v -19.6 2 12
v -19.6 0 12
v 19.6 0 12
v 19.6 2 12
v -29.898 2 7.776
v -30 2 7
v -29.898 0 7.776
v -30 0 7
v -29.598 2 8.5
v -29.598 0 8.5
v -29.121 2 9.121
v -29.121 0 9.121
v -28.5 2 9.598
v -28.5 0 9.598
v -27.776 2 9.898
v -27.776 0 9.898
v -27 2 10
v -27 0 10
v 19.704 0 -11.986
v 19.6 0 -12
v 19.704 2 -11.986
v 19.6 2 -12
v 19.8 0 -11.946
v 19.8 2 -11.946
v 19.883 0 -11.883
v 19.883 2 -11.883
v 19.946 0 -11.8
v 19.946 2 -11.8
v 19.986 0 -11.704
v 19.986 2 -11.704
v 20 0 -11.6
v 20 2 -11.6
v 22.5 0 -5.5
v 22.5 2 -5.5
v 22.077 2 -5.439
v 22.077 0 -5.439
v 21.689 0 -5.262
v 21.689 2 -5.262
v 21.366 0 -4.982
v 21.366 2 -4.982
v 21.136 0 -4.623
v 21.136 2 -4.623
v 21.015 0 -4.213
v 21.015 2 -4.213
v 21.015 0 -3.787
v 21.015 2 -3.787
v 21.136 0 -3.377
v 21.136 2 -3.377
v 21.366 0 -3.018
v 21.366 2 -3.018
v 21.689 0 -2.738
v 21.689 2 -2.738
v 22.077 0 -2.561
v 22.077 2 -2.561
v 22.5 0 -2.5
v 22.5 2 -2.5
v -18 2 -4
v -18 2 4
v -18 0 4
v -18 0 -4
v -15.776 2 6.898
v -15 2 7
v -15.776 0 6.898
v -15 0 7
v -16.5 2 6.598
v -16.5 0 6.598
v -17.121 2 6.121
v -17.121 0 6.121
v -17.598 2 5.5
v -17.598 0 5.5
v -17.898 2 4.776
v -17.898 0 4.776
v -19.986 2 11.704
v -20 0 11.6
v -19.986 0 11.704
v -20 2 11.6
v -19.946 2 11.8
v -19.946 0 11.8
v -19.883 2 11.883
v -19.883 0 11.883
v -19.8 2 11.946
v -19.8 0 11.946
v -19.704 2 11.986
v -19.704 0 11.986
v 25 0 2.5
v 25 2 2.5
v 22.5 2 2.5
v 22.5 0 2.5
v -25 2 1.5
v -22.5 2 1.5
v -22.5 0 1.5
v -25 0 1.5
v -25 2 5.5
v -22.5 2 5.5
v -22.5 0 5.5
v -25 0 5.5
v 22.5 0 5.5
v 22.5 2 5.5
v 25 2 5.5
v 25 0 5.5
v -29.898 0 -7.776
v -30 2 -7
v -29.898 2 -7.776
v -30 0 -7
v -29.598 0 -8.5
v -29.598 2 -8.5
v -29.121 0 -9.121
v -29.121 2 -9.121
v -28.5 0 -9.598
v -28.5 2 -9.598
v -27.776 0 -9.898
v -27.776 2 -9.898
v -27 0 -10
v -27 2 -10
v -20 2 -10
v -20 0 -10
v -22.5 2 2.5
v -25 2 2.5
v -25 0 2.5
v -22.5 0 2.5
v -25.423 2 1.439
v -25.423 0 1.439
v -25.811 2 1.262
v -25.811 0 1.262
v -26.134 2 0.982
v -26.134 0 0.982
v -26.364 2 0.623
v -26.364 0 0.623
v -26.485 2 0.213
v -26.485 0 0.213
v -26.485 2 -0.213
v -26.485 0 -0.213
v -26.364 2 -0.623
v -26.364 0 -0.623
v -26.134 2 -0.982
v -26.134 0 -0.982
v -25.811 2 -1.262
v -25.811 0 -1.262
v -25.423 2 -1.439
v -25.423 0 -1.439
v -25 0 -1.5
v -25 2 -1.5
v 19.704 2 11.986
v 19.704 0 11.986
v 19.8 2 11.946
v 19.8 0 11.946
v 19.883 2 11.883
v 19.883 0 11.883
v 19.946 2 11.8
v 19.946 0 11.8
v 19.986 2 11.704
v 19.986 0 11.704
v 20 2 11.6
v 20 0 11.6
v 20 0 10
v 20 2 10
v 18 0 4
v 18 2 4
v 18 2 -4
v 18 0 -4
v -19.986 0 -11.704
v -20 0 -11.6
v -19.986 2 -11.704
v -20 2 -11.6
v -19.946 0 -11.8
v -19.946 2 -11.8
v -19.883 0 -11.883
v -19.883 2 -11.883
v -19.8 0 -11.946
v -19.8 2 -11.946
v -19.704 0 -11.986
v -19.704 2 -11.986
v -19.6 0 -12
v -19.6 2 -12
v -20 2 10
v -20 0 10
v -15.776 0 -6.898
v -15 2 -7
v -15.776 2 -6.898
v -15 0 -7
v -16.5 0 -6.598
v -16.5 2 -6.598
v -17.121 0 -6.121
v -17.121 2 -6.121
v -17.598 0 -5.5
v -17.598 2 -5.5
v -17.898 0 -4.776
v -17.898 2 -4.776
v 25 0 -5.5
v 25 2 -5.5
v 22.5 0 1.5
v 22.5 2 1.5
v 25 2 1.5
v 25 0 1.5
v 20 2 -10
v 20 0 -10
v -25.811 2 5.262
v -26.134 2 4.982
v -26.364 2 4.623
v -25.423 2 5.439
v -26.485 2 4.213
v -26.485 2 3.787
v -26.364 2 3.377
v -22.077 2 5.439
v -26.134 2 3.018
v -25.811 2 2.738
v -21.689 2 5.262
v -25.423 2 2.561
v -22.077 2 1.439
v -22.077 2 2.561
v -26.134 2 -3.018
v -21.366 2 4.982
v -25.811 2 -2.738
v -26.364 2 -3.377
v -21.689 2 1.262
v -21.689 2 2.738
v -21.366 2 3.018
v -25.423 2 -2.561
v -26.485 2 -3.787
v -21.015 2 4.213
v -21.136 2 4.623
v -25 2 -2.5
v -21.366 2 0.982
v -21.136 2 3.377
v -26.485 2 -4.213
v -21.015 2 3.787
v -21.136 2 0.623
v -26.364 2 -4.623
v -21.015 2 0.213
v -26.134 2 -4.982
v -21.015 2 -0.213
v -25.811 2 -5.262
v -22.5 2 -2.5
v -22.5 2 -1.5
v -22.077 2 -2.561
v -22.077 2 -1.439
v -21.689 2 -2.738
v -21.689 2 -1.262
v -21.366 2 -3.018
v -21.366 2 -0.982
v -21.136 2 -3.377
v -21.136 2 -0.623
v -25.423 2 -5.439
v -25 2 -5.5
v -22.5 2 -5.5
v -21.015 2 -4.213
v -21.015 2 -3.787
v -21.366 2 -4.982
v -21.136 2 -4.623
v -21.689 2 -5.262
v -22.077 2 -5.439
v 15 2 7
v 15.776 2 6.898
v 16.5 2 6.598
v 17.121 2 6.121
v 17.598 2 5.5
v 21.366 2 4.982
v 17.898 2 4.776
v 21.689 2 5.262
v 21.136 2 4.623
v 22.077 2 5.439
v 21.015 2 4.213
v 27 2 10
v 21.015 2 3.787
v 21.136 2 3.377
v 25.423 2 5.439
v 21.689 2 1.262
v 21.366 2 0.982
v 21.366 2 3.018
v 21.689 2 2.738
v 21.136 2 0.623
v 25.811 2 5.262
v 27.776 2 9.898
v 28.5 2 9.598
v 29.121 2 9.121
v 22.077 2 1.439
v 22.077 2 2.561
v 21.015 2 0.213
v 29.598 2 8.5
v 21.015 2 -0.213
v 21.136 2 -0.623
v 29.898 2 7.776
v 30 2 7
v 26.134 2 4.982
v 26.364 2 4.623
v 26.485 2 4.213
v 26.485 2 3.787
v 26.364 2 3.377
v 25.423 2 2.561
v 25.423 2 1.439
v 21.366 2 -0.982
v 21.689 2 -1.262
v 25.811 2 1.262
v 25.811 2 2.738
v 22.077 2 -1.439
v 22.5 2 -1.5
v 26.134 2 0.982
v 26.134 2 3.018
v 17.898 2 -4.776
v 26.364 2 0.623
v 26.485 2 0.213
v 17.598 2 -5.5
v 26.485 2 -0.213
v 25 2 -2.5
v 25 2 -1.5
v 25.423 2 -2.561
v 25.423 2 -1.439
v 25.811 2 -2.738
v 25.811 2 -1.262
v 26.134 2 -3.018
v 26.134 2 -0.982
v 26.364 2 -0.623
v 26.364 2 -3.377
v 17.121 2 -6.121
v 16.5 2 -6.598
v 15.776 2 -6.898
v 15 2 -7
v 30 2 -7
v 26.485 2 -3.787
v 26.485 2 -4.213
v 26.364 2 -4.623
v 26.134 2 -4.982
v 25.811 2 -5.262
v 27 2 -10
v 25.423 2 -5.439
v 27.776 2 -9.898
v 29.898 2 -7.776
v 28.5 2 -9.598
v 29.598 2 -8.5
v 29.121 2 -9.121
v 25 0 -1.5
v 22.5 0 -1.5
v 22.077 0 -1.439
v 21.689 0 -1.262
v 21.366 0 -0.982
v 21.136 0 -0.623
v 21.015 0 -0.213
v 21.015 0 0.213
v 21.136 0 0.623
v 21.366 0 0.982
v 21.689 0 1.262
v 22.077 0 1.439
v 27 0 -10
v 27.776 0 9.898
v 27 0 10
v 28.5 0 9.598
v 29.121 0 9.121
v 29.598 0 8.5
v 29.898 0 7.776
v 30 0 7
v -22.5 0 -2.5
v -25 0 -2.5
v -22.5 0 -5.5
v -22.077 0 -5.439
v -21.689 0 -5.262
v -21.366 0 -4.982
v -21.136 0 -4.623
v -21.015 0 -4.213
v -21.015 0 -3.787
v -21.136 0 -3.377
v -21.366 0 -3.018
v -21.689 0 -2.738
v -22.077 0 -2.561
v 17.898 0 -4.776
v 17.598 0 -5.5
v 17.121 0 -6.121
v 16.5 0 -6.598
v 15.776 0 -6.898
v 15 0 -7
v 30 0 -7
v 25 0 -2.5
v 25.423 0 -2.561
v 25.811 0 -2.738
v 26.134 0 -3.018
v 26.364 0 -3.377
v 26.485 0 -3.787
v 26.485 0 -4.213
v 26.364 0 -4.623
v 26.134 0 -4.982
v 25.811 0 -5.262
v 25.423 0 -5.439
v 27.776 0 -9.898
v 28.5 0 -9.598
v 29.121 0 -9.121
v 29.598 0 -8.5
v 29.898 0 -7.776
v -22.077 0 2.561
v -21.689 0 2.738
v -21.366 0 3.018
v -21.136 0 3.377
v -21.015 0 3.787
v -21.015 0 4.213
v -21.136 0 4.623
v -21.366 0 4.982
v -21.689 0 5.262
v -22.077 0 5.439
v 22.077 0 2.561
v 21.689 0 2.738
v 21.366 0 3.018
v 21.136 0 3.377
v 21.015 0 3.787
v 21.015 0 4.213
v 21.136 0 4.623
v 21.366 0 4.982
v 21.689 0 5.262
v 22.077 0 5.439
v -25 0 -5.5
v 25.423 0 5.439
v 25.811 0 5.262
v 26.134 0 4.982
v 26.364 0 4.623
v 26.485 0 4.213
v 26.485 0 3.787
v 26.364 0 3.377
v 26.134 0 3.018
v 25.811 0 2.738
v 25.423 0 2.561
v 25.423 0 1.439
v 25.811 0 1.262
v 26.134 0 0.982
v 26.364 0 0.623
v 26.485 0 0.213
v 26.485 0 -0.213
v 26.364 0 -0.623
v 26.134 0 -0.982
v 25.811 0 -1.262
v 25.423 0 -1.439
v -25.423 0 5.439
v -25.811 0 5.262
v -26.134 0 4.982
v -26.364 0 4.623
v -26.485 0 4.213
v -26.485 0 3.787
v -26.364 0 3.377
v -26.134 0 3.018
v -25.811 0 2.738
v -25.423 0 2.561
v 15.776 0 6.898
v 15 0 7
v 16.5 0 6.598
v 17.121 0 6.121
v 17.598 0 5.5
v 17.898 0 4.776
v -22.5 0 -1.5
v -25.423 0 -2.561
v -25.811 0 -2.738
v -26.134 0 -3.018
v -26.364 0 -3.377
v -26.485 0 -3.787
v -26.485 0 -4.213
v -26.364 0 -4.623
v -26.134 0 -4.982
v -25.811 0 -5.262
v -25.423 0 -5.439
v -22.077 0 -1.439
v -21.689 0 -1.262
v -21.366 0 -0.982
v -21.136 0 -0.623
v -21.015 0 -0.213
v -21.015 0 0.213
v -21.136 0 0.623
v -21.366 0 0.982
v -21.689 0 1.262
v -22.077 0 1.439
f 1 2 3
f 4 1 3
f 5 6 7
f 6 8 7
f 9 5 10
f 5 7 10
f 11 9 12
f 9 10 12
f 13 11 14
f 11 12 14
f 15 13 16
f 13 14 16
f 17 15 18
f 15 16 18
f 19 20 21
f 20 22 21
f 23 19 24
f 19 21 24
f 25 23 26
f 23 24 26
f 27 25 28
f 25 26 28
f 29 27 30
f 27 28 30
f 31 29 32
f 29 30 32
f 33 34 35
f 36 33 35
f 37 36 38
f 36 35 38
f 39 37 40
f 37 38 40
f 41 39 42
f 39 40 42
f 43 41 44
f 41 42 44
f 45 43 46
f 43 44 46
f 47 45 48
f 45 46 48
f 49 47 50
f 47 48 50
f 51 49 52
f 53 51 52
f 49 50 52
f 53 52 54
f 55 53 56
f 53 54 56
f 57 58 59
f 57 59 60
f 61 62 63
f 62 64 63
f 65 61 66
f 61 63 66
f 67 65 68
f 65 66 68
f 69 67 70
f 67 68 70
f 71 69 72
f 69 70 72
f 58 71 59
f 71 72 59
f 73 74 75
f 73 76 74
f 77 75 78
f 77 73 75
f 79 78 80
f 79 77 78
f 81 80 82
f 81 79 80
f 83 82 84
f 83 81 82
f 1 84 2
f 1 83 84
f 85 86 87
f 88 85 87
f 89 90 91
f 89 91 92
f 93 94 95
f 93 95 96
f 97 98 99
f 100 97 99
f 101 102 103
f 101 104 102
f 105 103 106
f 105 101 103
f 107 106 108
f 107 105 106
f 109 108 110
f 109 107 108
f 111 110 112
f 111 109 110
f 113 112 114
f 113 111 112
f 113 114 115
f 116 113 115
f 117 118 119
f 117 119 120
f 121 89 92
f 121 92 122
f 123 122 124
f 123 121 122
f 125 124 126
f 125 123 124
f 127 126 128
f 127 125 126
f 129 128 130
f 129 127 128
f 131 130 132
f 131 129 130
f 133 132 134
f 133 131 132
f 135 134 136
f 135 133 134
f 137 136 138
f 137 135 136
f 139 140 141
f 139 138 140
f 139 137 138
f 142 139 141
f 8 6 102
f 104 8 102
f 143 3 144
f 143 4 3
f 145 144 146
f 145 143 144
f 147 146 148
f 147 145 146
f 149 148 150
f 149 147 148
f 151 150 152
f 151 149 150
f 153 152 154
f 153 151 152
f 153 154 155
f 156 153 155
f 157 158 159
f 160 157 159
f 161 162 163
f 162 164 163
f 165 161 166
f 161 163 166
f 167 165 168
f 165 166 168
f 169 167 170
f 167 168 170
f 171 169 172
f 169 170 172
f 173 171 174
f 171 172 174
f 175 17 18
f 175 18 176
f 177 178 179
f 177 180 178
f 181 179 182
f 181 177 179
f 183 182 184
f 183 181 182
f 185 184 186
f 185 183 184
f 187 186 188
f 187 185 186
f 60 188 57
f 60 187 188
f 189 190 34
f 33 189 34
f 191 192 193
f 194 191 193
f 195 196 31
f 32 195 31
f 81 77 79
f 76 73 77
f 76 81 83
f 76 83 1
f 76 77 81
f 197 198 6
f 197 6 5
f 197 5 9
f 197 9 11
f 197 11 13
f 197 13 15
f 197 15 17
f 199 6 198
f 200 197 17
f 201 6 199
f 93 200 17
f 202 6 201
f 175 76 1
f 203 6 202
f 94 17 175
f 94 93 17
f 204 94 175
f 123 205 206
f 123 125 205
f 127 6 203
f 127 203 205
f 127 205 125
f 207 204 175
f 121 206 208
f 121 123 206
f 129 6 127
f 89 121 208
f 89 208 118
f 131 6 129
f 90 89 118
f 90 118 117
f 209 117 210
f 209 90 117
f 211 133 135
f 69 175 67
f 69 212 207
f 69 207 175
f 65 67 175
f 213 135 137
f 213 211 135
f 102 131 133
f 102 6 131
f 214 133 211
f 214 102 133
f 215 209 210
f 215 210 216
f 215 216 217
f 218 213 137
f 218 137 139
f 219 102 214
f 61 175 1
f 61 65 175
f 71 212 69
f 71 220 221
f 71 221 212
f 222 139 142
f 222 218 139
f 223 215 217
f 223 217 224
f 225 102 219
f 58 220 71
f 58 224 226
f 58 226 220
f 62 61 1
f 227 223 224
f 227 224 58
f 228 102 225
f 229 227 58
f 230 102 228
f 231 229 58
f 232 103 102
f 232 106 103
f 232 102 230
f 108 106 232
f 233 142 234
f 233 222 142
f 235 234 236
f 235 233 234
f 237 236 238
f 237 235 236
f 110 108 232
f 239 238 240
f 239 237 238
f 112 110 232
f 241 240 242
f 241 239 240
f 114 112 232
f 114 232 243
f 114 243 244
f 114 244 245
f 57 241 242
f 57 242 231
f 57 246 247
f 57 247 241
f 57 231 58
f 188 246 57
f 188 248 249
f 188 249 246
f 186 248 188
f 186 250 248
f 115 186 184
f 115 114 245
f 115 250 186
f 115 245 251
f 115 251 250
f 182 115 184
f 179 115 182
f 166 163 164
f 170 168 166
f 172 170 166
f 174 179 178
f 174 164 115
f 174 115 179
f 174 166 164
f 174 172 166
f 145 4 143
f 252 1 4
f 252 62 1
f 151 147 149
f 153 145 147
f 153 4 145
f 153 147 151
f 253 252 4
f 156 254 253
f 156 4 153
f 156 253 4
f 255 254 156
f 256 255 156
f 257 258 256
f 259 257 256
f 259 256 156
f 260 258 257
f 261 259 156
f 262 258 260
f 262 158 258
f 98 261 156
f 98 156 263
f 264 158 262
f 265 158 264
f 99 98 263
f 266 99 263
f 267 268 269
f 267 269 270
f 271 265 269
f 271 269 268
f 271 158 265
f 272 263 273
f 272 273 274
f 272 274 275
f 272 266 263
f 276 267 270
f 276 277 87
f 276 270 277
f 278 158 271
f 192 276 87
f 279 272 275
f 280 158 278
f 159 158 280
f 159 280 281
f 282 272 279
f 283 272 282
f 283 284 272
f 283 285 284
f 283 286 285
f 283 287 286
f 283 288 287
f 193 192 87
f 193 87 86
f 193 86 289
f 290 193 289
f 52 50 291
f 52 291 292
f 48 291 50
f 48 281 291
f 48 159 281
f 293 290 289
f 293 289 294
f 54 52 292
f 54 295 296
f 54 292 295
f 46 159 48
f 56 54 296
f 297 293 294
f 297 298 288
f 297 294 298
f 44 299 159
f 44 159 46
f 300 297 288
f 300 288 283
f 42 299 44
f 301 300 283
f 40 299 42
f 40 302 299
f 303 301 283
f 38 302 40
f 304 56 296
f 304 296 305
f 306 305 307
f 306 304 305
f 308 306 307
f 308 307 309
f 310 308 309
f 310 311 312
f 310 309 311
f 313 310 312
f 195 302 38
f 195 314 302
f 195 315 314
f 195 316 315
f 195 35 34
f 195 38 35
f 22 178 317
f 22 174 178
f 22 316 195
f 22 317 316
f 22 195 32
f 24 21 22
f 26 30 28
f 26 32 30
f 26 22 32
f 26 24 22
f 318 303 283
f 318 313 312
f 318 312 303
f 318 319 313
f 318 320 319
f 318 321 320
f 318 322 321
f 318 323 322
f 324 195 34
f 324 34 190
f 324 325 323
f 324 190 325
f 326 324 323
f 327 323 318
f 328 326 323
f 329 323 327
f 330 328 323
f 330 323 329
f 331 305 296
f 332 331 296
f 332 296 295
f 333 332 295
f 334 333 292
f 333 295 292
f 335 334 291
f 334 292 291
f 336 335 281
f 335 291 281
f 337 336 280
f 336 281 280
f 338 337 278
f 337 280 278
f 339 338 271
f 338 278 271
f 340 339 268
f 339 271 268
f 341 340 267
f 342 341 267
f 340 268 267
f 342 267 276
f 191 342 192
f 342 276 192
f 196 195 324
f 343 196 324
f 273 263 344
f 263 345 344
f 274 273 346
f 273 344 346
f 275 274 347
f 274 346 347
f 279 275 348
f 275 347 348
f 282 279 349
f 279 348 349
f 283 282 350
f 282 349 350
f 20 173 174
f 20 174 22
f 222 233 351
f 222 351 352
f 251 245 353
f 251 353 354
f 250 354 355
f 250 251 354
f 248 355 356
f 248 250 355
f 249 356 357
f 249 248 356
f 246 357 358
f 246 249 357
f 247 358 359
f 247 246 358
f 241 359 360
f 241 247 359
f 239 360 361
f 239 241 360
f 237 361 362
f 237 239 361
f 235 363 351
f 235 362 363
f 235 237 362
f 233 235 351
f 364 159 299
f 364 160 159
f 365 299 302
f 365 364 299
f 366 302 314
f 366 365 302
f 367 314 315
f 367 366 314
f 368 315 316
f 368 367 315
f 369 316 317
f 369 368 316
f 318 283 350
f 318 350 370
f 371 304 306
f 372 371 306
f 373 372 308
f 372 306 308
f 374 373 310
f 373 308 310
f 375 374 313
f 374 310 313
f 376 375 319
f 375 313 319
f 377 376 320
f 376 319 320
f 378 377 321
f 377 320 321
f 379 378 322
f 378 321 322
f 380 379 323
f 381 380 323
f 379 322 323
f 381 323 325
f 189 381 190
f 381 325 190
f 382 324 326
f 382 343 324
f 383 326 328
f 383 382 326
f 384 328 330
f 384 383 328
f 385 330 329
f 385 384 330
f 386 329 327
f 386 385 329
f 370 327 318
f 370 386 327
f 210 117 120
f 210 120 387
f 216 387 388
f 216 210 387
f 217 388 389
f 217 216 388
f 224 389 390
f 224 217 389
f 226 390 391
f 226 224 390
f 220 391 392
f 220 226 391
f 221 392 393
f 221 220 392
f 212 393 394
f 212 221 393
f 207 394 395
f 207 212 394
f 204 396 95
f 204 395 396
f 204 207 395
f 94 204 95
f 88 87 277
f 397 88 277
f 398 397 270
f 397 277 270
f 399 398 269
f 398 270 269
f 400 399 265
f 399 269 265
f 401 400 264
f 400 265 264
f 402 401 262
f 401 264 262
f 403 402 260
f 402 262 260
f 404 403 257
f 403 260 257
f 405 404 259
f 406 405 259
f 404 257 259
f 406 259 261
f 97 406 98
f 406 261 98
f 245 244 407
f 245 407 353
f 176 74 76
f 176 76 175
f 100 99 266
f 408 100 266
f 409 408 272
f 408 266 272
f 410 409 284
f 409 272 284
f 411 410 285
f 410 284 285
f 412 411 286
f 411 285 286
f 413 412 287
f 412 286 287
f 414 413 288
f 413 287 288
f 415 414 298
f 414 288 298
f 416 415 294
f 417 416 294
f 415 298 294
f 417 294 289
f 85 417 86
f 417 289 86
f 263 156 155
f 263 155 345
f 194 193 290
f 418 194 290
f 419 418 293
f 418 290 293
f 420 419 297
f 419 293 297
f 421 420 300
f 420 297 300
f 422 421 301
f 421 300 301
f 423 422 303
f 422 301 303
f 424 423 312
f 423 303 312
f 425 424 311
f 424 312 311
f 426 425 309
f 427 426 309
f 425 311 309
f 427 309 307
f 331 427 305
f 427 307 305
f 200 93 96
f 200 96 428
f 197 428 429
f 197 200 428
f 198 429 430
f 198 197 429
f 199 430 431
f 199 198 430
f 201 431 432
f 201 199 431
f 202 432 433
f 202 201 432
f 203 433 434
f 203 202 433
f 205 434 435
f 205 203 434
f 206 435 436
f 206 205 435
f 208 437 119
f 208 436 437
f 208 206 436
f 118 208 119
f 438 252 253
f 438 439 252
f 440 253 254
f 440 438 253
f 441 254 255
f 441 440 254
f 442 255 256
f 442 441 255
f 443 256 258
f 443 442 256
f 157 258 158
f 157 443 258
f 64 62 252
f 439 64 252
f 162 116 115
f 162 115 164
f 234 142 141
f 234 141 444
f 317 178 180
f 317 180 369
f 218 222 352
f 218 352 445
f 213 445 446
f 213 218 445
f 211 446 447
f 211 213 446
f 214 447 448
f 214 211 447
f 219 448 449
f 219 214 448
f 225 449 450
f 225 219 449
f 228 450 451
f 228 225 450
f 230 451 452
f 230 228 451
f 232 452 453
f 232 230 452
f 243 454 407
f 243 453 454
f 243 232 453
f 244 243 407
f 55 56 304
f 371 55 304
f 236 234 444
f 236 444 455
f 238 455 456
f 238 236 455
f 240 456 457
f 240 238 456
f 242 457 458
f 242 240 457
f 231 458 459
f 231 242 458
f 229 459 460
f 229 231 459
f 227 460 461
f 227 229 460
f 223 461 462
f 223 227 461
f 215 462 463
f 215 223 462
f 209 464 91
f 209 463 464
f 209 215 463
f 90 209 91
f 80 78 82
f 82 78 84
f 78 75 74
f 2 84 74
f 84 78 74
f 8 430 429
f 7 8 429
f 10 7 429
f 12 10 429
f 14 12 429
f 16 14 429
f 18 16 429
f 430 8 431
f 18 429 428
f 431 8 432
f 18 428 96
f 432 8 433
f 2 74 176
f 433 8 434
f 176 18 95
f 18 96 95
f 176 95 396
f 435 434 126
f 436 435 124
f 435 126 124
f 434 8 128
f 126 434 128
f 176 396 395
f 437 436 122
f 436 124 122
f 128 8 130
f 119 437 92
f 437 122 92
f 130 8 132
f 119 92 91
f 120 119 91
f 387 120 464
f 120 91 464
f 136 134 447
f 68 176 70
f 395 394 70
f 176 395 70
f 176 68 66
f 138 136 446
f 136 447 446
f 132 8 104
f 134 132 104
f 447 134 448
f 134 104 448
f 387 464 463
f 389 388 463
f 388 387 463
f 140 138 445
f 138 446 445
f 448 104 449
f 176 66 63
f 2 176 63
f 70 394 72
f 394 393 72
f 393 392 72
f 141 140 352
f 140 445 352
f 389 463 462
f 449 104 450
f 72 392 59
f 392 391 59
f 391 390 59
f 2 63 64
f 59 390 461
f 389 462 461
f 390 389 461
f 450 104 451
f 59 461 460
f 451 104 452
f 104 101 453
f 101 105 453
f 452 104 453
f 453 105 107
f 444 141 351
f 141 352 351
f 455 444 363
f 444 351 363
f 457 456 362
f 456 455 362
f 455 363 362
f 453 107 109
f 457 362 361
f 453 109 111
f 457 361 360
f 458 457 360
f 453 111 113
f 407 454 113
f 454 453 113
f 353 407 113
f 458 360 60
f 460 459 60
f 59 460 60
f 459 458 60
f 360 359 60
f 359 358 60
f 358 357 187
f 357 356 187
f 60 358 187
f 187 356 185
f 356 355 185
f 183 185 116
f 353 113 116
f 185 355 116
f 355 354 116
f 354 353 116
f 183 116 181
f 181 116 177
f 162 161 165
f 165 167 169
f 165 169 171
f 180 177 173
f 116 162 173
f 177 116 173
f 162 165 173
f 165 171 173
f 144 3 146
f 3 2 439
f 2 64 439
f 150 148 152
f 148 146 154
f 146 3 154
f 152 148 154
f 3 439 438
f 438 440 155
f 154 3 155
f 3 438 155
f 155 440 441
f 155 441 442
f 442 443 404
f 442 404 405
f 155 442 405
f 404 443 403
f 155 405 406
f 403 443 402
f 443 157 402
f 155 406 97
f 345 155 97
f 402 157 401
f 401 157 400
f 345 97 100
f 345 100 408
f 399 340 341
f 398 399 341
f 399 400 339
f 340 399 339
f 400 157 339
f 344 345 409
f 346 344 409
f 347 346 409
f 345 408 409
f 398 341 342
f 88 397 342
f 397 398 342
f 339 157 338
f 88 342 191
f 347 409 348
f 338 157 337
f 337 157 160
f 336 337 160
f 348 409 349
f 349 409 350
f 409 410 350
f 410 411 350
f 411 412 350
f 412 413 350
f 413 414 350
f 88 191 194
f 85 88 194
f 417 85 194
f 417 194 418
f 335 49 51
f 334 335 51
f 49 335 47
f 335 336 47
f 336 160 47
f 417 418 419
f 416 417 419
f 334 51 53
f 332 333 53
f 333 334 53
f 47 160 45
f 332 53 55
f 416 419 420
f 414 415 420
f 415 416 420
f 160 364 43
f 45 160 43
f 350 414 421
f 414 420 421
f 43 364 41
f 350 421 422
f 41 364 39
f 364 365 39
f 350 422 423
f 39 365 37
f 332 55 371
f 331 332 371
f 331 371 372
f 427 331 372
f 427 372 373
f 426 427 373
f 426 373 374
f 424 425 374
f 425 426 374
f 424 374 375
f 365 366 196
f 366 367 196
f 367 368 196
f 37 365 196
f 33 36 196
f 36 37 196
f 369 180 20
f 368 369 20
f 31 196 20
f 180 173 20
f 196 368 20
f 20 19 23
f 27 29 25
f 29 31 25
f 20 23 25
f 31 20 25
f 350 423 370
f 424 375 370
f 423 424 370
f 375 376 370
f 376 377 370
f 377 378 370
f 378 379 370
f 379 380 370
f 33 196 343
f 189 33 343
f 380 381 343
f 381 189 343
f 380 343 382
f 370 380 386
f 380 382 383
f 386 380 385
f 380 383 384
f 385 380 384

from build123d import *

# Parameters (mm, degrees)
SKETCH_1_W          = 40
SKETCH_1_H          = 24
EXTRUDE_1_DEPTH     = 2
SKETCH_4_W          = 60
SKETCH_4_H          = 20
EXTRUDE_3_DEPTH     = 2
CUT_EXTRUDE_3_DEPTH = 33.372828112
SKETCH_7_W          = 36
SKETCH_7_H          = 14
CUT_EXTRUDE_4_DEPTH = 33.372828112
FILLET_1_R          = 3
FILLET_2_R          = 0.4


with BuildPart() as part:
    # 草图1 → 凸台-拉伸1 (new body)
    with BuildSketch(Plane(origin=(0, 0, 0), x_dir=(1, 0, 0), z_dir=(0, 1, 0))):
        Rectangle(SKETCH_1_W, SKETCH_1_H)
    extrude(amount=EXTRUDE_1_DEPTH)

    # 草图4 → 凸台-拉伸3 (add)
    with BuildSketch(Plane(origin=(0, 2, 0), x_dir=(1, 0, 0), z_dir=(0, 1, 0))):
        Rectangle(SKETCH_4_W, SKETCH_4_H)
    extrude(amount=-EXTRUDE_3_DEPTH)

    # 草图6 → 切除-拉伸3 (cut, through all)
    with BuildSketch(Plane(origin=(0, 2, 0), x_dir=(1, 0, 0), z_dir=(0, 1, 0))):
        with BuildLine():
            Line((-25, 1.5), (-22.5, 1.5))
            ThreePointArc((-22.5, 1.5), (-21, 0), (-22.5, -1.5))
            Line((-22.5, -1.5), (-25, -1.5))
            ThreePointArc((-25, -1.5), (-26.5, 0), (-25, 1.5))
        make_face()
        with BuildLine():
            Line((-25, 5.5), (-22.5, 5.5))
            ThreePointArc((-22.5, 5.5), (-21, 4), (-22.5, 2.5))
            Line((-22.5, 2.5), (-25, 2.5))
            ThreePointArc((-25, 2.5), (-26.5, 4), (-25, 5.5))
        make_face()
        with BuildLine():
            Line((-25, -2.5), (-22.5, -2.5))
            ThreePointArc((-22.5, -2.5), (-21, -4), (-22.5, -5.5))
            Line((-22.5, -5.5), (-25, -5.5))
            ThreePointArc((-25, -5.5), (-26.5, -4), (-25, -2.5))
        make_face()
        with BuildLine():
            Line((25, -2.5), (22.5, -2.5))
            ThreePointArc((22.5, -2.5), (21, -4), (22.5, -5.5))
            Line((22.5, -5.5), (25, -5.5))
            ThreePointArc((25, -5.5), (26.5, -4), (25, -2.5))
        make_face()
        with BuildLine():
            Line((25, 1.5), (22.5, 1.5))
            ThreePointArc((22.5, 1.5), (21, 0), (22.5, -1.5))
            Line((22.5, -1.5), (25, -1.5))
            ThreePointArc((25, -1.5), (26.5, 0), (25, 1.5))
        make_face()
        with BuildLine():
            Line((25, 5.5), (22.5, 5.5))
            ThreePointArc((22.5, 5.5), (21, 4), (22.5, 2.5))
            Line((22.5, 2.5), (25, 2.5))
            ThreePointArc((25, 2.5), (26.5, 4), (25, 5.5))
        make_face()
    extrude(amount=-CUT_EXTRUDE_3_DEPTH, mode=Mode.SUBTRACT)

    # 草图7 → 切除-拉伸4 (cut, through all)
    with BuildSketch(Plane(origin=(0, 2, 0), x_dir=(1, 0, 0), z_dir=(0, 1, 0))):
        Rectangle(SKETCH_7_W, SKETCH_7_H)
    extrude(amount=-CUT_EXTRUDE_4_DEPTH, mode=Mode.SUBTRACT)

    # 圆角1
    fillet_1_edges = [part.edges().sort_by_distance(p)[0] for p in [
        (18, 1, -7),
        (18, 1, 7),
        (-18, 1, 7),
        (-18, 1, -7),
        (30, 1, 10),
        (-30, 1, -10),
        (30, 1, -10),
        (-30, 1, 10),
    ]]
    fillet(fillet_1_edges, radius=FILLET_1_R)

    # 圆角2
    fillet_2_edges = [part.edges().sort_by_distance(p)[0] for p in [
        (20, 1, 12),
        (-20, 1, 12),
        (-20, 1, -12),
        (20, 1, -12),
    ]]
    fillet(fillet_2_edges, radius=FILLET_2_R)


solid = part.part
